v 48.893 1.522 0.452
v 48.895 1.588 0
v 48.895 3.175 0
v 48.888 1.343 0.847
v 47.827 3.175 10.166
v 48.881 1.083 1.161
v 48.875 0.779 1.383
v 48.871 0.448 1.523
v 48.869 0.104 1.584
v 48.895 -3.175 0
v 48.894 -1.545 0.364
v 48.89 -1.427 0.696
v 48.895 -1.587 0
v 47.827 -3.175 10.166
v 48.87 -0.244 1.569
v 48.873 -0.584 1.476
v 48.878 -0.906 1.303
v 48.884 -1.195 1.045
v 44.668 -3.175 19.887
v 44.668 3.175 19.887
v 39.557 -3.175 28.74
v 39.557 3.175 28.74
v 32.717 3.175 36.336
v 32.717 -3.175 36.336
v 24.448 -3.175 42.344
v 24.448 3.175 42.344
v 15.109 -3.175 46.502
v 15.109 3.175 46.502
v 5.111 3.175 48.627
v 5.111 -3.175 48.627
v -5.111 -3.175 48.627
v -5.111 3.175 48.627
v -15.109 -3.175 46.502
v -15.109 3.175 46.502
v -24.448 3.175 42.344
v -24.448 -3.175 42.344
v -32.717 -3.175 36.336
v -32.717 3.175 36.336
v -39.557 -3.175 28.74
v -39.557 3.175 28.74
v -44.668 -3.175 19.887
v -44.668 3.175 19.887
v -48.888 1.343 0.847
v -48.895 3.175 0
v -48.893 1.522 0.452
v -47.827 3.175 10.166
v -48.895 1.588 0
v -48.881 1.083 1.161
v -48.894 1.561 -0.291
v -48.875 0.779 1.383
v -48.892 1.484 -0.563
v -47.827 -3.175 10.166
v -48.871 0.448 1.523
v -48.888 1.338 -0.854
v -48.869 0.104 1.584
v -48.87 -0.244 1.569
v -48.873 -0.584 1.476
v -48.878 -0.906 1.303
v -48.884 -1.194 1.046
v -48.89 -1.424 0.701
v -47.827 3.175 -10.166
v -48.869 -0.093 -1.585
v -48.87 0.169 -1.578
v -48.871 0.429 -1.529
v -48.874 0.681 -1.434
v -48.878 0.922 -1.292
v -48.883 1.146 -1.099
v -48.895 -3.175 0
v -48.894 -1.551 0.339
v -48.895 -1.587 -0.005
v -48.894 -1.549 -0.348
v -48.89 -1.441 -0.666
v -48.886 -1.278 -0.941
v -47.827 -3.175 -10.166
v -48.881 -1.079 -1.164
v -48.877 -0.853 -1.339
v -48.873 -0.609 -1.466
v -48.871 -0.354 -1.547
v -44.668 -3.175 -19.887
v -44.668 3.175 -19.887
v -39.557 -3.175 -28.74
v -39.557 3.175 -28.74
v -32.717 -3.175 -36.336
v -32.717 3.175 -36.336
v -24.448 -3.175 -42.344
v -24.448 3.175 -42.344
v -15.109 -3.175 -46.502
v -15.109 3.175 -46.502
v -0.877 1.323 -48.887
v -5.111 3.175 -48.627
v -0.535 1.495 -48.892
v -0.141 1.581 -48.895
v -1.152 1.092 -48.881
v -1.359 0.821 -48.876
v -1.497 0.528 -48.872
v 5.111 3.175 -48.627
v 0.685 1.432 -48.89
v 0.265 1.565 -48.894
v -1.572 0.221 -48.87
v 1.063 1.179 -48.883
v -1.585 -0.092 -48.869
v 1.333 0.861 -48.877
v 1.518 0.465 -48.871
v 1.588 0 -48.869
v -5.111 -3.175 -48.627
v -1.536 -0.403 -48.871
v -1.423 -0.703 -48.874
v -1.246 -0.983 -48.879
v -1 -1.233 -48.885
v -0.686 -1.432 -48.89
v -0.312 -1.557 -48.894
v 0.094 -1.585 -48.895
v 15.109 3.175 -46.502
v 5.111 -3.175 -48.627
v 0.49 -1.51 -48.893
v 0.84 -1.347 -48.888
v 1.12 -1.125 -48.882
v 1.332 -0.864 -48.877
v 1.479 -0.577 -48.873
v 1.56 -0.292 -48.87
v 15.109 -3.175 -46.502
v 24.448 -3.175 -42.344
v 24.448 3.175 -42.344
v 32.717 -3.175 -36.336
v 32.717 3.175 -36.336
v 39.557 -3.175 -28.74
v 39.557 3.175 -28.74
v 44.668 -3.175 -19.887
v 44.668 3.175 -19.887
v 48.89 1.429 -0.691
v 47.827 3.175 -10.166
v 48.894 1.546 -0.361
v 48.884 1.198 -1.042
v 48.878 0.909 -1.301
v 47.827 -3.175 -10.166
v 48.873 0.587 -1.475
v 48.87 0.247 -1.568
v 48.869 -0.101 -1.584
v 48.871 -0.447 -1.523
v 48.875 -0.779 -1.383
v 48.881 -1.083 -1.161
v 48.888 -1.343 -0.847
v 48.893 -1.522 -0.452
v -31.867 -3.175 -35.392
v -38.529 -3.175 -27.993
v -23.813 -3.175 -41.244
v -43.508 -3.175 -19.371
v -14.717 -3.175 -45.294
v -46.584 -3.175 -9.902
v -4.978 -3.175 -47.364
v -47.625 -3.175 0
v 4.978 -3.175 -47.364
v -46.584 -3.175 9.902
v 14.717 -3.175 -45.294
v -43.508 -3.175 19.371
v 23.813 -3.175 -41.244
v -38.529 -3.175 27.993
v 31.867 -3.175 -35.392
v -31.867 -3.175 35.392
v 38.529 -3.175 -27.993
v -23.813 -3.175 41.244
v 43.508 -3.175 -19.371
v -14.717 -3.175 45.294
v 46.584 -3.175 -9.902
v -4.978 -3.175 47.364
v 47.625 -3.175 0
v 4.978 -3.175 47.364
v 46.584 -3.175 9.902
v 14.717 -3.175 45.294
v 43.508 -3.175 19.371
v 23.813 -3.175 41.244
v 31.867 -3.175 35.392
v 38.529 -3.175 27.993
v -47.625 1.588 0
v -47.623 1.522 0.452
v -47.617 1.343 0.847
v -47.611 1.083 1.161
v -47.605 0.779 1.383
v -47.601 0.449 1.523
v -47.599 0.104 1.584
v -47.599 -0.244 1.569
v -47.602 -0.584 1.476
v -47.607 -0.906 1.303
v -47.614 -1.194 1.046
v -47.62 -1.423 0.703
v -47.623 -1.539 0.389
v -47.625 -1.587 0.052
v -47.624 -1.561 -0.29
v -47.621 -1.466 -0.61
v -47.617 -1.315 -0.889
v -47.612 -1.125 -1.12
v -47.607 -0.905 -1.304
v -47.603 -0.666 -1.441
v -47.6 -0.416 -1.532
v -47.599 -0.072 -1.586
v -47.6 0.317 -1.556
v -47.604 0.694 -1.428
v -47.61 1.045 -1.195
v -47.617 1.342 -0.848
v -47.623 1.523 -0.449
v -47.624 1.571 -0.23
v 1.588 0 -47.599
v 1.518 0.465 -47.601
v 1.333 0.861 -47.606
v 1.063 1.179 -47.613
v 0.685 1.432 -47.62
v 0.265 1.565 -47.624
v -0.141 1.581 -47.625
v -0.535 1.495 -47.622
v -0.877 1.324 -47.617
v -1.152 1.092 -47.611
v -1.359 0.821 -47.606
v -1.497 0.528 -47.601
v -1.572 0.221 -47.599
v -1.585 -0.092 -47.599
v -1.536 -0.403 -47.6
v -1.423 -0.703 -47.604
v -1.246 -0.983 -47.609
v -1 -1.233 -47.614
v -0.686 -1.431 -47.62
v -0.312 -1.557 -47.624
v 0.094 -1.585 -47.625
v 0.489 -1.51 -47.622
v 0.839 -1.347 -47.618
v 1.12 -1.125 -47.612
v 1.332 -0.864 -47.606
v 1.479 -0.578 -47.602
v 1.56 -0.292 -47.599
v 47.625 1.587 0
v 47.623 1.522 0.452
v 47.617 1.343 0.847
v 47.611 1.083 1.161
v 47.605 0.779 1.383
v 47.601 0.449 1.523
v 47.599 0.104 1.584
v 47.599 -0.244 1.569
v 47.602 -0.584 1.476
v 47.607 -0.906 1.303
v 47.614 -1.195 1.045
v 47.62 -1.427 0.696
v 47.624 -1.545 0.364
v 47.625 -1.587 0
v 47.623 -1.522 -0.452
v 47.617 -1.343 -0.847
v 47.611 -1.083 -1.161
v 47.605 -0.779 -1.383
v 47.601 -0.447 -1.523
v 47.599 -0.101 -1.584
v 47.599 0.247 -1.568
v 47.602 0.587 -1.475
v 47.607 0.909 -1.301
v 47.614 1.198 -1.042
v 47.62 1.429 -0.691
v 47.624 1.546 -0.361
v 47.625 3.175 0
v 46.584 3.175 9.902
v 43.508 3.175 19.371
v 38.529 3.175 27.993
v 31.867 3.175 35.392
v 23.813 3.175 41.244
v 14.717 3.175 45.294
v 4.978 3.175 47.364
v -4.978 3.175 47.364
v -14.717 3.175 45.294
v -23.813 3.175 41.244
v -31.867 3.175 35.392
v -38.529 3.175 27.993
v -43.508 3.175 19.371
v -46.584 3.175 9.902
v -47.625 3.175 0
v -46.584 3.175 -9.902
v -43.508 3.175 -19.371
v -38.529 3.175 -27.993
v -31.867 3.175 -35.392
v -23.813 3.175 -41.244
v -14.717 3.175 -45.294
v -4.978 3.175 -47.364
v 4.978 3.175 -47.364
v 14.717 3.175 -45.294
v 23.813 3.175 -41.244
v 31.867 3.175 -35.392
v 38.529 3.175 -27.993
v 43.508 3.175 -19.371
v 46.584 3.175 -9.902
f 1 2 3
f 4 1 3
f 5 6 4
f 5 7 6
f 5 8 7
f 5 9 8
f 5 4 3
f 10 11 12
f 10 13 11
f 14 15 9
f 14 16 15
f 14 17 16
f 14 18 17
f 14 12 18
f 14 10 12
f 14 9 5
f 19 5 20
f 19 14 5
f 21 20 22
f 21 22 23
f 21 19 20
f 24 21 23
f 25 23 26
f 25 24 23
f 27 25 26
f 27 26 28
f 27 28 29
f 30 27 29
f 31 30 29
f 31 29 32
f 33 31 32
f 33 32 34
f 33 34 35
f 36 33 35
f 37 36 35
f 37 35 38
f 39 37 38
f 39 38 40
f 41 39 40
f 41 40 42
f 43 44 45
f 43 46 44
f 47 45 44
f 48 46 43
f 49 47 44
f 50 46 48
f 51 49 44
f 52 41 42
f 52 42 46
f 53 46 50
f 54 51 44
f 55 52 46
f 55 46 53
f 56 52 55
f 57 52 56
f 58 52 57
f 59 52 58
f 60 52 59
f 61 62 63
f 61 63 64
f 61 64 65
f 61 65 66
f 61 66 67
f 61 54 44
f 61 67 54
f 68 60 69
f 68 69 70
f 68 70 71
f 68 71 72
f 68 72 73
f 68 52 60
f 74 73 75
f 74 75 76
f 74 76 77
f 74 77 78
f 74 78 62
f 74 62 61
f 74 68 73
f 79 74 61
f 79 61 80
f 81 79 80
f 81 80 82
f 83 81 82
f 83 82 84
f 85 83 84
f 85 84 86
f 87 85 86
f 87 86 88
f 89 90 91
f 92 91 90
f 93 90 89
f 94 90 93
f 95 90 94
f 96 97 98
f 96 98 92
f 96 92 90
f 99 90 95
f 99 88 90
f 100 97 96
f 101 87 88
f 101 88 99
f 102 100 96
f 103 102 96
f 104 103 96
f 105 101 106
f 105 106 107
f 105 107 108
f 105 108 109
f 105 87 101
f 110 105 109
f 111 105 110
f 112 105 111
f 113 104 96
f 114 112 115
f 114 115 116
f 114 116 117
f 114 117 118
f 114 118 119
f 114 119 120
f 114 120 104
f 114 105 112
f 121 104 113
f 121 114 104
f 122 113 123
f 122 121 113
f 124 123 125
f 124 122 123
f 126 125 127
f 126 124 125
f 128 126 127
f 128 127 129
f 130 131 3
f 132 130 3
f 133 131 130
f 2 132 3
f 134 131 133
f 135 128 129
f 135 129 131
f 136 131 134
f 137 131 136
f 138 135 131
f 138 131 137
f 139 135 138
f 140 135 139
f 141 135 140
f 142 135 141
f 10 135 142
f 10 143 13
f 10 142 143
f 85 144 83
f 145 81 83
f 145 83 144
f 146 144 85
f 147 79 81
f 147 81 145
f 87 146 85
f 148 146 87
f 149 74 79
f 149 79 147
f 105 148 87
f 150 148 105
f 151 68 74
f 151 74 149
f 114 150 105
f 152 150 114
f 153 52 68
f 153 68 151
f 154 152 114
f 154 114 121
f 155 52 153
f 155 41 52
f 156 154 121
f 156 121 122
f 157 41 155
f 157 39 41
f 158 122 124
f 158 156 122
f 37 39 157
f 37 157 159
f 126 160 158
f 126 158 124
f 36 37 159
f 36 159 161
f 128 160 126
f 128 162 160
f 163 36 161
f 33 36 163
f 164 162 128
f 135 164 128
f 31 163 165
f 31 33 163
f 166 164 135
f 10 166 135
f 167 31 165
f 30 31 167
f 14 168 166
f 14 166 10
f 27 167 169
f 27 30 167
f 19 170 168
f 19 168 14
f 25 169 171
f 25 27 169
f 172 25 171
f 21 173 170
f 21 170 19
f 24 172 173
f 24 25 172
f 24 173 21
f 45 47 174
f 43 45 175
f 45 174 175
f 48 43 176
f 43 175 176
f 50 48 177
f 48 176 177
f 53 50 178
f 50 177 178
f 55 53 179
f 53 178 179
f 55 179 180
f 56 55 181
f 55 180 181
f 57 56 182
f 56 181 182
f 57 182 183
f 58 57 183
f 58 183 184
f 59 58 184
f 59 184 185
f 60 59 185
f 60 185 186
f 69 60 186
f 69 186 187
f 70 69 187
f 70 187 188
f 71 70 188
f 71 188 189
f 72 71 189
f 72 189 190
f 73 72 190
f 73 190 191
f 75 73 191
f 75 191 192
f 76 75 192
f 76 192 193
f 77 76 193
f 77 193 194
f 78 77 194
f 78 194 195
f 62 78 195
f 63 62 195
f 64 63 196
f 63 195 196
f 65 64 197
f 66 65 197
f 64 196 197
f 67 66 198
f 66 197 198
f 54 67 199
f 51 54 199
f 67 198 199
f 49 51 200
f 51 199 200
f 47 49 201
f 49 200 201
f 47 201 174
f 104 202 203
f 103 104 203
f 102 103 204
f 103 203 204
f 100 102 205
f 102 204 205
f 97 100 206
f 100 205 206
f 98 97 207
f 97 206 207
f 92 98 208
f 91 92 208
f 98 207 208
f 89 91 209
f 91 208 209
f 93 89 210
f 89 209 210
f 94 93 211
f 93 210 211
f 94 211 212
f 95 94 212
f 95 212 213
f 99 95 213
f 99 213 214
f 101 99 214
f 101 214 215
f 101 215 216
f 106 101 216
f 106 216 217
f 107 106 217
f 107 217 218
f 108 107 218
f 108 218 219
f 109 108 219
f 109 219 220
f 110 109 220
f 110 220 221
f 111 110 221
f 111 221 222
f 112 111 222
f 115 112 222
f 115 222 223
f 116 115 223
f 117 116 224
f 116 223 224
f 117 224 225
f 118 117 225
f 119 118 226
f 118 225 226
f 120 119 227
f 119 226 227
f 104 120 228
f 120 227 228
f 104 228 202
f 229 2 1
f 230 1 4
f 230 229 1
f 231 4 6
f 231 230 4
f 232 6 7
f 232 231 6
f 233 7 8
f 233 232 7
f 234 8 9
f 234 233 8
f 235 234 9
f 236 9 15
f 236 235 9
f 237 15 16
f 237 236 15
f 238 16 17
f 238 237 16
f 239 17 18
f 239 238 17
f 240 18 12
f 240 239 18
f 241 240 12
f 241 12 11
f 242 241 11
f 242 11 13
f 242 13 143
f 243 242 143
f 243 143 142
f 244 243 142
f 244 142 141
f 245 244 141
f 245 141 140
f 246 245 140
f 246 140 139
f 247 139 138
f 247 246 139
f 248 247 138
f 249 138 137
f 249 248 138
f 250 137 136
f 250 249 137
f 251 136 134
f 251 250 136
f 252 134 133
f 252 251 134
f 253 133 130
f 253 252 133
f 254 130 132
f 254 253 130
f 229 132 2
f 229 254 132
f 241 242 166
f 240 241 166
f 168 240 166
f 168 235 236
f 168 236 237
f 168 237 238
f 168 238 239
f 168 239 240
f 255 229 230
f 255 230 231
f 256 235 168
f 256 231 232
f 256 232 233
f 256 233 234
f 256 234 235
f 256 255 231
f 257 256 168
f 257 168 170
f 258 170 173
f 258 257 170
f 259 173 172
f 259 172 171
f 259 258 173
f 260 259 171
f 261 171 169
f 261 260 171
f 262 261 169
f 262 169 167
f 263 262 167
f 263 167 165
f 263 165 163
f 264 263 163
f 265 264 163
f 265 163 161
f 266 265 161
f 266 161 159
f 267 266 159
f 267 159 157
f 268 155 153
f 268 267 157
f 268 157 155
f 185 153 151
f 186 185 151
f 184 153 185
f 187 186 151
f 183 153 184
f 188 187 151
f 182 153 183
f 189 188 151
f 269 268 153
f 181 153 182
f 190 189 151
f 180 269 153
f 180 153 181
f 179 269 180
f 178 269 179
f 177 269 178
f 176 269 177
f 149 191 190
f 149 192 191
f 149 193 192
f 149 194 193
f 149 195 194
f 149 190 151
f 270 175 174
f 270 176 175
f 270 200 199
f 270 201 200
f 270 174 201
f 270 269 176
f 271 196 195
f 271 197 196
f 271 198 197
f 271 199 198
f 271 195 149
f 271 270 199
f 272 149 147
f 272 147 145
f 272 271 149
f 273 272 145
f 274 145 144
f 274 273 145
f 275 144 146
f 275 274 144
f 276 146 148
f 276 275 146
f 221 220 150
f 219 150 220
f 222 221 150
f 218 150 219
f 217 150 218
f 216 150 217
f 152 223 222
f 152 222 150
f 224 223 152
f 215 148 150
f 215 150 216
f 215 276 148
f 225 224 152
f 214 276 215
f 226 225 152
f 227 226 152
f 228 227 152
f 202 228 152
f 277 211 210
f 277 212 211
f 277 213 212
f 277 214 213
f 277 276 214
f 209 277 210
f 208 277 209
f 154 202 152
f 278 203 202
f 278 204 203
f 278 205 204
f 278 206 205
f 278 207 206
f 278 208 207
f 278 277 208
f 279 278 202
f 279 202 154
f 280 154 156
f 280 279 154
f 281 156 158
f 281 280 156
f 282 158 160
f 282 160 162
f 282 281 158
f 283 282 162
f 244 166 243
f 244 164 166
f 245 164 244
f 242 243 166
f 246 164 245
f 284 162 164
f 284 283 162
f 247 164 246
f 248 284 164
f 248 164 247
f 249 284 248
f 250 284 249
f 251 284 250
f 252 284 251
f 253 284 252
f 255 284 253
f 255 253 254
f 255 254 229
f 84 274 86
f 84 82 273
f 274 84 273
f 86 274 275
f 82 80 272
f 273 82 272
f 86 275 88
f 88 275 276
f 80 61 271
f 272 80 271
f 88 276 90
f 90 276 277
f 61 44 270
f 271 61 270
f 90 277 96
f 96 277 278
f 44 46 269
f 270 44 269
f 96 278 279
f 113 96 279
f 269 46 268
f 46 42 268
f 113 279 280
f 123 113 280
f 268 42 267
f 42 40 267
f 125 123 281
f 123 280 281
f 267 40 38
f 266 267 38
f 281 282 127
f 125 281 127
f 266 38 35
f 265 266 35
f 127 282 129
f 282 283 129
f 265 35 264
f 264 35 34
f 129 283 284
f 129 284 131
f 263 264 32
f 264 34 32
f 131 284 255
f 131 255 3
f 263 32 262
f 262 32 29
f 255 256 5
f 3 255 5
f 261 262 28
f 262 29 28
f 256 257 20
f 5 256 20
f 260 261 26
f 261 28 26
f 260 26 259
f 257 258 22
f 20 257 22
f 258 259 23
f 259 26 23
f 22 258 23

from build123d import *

# Parameters (mm, degrees)
F0_R          = 48.895
F0_R_2        = 47.625
F1_DEPTH      = 3.175
F2_R          = 1.5875
F3_DEPTH      = 48.896
F3_DEPTH_BACK = 88.97111
F4_R          = 1.5875
F5_DEPTH      = 48.8960001


with BuildPart() as f1:
    # F0 (on Front) → F1 (new body, symmetric)
    with BuildSketch(Plane.XZ):
        Circle(F0_R)
        Circle(F0_R_2, mode=Mode.SUBTRACT)
    extrude(amount=F1_DEPTH, both=True)

    # F2 (on Right) → F3 (cut, two sides)
    with BuildSketch(Plane.YZ) as f3_sk:
        Circle(F2_R)
    extrude(amount=-F3_DEPTH, mode=Mode.SUBTRACT)
    extrude(f3_sk.sketch, amount=F3_DEPTH_BACK, mode=Mode.SUBTRACT)

    # F4 (on Top) → F5 (cut, through all)
    with BuildSketch(Plane.XY):
        Circle(F4_R)
    extrude(amount=-F5_DEPTH, mode=Mode.SUBTRACT)


solid = f1.part
